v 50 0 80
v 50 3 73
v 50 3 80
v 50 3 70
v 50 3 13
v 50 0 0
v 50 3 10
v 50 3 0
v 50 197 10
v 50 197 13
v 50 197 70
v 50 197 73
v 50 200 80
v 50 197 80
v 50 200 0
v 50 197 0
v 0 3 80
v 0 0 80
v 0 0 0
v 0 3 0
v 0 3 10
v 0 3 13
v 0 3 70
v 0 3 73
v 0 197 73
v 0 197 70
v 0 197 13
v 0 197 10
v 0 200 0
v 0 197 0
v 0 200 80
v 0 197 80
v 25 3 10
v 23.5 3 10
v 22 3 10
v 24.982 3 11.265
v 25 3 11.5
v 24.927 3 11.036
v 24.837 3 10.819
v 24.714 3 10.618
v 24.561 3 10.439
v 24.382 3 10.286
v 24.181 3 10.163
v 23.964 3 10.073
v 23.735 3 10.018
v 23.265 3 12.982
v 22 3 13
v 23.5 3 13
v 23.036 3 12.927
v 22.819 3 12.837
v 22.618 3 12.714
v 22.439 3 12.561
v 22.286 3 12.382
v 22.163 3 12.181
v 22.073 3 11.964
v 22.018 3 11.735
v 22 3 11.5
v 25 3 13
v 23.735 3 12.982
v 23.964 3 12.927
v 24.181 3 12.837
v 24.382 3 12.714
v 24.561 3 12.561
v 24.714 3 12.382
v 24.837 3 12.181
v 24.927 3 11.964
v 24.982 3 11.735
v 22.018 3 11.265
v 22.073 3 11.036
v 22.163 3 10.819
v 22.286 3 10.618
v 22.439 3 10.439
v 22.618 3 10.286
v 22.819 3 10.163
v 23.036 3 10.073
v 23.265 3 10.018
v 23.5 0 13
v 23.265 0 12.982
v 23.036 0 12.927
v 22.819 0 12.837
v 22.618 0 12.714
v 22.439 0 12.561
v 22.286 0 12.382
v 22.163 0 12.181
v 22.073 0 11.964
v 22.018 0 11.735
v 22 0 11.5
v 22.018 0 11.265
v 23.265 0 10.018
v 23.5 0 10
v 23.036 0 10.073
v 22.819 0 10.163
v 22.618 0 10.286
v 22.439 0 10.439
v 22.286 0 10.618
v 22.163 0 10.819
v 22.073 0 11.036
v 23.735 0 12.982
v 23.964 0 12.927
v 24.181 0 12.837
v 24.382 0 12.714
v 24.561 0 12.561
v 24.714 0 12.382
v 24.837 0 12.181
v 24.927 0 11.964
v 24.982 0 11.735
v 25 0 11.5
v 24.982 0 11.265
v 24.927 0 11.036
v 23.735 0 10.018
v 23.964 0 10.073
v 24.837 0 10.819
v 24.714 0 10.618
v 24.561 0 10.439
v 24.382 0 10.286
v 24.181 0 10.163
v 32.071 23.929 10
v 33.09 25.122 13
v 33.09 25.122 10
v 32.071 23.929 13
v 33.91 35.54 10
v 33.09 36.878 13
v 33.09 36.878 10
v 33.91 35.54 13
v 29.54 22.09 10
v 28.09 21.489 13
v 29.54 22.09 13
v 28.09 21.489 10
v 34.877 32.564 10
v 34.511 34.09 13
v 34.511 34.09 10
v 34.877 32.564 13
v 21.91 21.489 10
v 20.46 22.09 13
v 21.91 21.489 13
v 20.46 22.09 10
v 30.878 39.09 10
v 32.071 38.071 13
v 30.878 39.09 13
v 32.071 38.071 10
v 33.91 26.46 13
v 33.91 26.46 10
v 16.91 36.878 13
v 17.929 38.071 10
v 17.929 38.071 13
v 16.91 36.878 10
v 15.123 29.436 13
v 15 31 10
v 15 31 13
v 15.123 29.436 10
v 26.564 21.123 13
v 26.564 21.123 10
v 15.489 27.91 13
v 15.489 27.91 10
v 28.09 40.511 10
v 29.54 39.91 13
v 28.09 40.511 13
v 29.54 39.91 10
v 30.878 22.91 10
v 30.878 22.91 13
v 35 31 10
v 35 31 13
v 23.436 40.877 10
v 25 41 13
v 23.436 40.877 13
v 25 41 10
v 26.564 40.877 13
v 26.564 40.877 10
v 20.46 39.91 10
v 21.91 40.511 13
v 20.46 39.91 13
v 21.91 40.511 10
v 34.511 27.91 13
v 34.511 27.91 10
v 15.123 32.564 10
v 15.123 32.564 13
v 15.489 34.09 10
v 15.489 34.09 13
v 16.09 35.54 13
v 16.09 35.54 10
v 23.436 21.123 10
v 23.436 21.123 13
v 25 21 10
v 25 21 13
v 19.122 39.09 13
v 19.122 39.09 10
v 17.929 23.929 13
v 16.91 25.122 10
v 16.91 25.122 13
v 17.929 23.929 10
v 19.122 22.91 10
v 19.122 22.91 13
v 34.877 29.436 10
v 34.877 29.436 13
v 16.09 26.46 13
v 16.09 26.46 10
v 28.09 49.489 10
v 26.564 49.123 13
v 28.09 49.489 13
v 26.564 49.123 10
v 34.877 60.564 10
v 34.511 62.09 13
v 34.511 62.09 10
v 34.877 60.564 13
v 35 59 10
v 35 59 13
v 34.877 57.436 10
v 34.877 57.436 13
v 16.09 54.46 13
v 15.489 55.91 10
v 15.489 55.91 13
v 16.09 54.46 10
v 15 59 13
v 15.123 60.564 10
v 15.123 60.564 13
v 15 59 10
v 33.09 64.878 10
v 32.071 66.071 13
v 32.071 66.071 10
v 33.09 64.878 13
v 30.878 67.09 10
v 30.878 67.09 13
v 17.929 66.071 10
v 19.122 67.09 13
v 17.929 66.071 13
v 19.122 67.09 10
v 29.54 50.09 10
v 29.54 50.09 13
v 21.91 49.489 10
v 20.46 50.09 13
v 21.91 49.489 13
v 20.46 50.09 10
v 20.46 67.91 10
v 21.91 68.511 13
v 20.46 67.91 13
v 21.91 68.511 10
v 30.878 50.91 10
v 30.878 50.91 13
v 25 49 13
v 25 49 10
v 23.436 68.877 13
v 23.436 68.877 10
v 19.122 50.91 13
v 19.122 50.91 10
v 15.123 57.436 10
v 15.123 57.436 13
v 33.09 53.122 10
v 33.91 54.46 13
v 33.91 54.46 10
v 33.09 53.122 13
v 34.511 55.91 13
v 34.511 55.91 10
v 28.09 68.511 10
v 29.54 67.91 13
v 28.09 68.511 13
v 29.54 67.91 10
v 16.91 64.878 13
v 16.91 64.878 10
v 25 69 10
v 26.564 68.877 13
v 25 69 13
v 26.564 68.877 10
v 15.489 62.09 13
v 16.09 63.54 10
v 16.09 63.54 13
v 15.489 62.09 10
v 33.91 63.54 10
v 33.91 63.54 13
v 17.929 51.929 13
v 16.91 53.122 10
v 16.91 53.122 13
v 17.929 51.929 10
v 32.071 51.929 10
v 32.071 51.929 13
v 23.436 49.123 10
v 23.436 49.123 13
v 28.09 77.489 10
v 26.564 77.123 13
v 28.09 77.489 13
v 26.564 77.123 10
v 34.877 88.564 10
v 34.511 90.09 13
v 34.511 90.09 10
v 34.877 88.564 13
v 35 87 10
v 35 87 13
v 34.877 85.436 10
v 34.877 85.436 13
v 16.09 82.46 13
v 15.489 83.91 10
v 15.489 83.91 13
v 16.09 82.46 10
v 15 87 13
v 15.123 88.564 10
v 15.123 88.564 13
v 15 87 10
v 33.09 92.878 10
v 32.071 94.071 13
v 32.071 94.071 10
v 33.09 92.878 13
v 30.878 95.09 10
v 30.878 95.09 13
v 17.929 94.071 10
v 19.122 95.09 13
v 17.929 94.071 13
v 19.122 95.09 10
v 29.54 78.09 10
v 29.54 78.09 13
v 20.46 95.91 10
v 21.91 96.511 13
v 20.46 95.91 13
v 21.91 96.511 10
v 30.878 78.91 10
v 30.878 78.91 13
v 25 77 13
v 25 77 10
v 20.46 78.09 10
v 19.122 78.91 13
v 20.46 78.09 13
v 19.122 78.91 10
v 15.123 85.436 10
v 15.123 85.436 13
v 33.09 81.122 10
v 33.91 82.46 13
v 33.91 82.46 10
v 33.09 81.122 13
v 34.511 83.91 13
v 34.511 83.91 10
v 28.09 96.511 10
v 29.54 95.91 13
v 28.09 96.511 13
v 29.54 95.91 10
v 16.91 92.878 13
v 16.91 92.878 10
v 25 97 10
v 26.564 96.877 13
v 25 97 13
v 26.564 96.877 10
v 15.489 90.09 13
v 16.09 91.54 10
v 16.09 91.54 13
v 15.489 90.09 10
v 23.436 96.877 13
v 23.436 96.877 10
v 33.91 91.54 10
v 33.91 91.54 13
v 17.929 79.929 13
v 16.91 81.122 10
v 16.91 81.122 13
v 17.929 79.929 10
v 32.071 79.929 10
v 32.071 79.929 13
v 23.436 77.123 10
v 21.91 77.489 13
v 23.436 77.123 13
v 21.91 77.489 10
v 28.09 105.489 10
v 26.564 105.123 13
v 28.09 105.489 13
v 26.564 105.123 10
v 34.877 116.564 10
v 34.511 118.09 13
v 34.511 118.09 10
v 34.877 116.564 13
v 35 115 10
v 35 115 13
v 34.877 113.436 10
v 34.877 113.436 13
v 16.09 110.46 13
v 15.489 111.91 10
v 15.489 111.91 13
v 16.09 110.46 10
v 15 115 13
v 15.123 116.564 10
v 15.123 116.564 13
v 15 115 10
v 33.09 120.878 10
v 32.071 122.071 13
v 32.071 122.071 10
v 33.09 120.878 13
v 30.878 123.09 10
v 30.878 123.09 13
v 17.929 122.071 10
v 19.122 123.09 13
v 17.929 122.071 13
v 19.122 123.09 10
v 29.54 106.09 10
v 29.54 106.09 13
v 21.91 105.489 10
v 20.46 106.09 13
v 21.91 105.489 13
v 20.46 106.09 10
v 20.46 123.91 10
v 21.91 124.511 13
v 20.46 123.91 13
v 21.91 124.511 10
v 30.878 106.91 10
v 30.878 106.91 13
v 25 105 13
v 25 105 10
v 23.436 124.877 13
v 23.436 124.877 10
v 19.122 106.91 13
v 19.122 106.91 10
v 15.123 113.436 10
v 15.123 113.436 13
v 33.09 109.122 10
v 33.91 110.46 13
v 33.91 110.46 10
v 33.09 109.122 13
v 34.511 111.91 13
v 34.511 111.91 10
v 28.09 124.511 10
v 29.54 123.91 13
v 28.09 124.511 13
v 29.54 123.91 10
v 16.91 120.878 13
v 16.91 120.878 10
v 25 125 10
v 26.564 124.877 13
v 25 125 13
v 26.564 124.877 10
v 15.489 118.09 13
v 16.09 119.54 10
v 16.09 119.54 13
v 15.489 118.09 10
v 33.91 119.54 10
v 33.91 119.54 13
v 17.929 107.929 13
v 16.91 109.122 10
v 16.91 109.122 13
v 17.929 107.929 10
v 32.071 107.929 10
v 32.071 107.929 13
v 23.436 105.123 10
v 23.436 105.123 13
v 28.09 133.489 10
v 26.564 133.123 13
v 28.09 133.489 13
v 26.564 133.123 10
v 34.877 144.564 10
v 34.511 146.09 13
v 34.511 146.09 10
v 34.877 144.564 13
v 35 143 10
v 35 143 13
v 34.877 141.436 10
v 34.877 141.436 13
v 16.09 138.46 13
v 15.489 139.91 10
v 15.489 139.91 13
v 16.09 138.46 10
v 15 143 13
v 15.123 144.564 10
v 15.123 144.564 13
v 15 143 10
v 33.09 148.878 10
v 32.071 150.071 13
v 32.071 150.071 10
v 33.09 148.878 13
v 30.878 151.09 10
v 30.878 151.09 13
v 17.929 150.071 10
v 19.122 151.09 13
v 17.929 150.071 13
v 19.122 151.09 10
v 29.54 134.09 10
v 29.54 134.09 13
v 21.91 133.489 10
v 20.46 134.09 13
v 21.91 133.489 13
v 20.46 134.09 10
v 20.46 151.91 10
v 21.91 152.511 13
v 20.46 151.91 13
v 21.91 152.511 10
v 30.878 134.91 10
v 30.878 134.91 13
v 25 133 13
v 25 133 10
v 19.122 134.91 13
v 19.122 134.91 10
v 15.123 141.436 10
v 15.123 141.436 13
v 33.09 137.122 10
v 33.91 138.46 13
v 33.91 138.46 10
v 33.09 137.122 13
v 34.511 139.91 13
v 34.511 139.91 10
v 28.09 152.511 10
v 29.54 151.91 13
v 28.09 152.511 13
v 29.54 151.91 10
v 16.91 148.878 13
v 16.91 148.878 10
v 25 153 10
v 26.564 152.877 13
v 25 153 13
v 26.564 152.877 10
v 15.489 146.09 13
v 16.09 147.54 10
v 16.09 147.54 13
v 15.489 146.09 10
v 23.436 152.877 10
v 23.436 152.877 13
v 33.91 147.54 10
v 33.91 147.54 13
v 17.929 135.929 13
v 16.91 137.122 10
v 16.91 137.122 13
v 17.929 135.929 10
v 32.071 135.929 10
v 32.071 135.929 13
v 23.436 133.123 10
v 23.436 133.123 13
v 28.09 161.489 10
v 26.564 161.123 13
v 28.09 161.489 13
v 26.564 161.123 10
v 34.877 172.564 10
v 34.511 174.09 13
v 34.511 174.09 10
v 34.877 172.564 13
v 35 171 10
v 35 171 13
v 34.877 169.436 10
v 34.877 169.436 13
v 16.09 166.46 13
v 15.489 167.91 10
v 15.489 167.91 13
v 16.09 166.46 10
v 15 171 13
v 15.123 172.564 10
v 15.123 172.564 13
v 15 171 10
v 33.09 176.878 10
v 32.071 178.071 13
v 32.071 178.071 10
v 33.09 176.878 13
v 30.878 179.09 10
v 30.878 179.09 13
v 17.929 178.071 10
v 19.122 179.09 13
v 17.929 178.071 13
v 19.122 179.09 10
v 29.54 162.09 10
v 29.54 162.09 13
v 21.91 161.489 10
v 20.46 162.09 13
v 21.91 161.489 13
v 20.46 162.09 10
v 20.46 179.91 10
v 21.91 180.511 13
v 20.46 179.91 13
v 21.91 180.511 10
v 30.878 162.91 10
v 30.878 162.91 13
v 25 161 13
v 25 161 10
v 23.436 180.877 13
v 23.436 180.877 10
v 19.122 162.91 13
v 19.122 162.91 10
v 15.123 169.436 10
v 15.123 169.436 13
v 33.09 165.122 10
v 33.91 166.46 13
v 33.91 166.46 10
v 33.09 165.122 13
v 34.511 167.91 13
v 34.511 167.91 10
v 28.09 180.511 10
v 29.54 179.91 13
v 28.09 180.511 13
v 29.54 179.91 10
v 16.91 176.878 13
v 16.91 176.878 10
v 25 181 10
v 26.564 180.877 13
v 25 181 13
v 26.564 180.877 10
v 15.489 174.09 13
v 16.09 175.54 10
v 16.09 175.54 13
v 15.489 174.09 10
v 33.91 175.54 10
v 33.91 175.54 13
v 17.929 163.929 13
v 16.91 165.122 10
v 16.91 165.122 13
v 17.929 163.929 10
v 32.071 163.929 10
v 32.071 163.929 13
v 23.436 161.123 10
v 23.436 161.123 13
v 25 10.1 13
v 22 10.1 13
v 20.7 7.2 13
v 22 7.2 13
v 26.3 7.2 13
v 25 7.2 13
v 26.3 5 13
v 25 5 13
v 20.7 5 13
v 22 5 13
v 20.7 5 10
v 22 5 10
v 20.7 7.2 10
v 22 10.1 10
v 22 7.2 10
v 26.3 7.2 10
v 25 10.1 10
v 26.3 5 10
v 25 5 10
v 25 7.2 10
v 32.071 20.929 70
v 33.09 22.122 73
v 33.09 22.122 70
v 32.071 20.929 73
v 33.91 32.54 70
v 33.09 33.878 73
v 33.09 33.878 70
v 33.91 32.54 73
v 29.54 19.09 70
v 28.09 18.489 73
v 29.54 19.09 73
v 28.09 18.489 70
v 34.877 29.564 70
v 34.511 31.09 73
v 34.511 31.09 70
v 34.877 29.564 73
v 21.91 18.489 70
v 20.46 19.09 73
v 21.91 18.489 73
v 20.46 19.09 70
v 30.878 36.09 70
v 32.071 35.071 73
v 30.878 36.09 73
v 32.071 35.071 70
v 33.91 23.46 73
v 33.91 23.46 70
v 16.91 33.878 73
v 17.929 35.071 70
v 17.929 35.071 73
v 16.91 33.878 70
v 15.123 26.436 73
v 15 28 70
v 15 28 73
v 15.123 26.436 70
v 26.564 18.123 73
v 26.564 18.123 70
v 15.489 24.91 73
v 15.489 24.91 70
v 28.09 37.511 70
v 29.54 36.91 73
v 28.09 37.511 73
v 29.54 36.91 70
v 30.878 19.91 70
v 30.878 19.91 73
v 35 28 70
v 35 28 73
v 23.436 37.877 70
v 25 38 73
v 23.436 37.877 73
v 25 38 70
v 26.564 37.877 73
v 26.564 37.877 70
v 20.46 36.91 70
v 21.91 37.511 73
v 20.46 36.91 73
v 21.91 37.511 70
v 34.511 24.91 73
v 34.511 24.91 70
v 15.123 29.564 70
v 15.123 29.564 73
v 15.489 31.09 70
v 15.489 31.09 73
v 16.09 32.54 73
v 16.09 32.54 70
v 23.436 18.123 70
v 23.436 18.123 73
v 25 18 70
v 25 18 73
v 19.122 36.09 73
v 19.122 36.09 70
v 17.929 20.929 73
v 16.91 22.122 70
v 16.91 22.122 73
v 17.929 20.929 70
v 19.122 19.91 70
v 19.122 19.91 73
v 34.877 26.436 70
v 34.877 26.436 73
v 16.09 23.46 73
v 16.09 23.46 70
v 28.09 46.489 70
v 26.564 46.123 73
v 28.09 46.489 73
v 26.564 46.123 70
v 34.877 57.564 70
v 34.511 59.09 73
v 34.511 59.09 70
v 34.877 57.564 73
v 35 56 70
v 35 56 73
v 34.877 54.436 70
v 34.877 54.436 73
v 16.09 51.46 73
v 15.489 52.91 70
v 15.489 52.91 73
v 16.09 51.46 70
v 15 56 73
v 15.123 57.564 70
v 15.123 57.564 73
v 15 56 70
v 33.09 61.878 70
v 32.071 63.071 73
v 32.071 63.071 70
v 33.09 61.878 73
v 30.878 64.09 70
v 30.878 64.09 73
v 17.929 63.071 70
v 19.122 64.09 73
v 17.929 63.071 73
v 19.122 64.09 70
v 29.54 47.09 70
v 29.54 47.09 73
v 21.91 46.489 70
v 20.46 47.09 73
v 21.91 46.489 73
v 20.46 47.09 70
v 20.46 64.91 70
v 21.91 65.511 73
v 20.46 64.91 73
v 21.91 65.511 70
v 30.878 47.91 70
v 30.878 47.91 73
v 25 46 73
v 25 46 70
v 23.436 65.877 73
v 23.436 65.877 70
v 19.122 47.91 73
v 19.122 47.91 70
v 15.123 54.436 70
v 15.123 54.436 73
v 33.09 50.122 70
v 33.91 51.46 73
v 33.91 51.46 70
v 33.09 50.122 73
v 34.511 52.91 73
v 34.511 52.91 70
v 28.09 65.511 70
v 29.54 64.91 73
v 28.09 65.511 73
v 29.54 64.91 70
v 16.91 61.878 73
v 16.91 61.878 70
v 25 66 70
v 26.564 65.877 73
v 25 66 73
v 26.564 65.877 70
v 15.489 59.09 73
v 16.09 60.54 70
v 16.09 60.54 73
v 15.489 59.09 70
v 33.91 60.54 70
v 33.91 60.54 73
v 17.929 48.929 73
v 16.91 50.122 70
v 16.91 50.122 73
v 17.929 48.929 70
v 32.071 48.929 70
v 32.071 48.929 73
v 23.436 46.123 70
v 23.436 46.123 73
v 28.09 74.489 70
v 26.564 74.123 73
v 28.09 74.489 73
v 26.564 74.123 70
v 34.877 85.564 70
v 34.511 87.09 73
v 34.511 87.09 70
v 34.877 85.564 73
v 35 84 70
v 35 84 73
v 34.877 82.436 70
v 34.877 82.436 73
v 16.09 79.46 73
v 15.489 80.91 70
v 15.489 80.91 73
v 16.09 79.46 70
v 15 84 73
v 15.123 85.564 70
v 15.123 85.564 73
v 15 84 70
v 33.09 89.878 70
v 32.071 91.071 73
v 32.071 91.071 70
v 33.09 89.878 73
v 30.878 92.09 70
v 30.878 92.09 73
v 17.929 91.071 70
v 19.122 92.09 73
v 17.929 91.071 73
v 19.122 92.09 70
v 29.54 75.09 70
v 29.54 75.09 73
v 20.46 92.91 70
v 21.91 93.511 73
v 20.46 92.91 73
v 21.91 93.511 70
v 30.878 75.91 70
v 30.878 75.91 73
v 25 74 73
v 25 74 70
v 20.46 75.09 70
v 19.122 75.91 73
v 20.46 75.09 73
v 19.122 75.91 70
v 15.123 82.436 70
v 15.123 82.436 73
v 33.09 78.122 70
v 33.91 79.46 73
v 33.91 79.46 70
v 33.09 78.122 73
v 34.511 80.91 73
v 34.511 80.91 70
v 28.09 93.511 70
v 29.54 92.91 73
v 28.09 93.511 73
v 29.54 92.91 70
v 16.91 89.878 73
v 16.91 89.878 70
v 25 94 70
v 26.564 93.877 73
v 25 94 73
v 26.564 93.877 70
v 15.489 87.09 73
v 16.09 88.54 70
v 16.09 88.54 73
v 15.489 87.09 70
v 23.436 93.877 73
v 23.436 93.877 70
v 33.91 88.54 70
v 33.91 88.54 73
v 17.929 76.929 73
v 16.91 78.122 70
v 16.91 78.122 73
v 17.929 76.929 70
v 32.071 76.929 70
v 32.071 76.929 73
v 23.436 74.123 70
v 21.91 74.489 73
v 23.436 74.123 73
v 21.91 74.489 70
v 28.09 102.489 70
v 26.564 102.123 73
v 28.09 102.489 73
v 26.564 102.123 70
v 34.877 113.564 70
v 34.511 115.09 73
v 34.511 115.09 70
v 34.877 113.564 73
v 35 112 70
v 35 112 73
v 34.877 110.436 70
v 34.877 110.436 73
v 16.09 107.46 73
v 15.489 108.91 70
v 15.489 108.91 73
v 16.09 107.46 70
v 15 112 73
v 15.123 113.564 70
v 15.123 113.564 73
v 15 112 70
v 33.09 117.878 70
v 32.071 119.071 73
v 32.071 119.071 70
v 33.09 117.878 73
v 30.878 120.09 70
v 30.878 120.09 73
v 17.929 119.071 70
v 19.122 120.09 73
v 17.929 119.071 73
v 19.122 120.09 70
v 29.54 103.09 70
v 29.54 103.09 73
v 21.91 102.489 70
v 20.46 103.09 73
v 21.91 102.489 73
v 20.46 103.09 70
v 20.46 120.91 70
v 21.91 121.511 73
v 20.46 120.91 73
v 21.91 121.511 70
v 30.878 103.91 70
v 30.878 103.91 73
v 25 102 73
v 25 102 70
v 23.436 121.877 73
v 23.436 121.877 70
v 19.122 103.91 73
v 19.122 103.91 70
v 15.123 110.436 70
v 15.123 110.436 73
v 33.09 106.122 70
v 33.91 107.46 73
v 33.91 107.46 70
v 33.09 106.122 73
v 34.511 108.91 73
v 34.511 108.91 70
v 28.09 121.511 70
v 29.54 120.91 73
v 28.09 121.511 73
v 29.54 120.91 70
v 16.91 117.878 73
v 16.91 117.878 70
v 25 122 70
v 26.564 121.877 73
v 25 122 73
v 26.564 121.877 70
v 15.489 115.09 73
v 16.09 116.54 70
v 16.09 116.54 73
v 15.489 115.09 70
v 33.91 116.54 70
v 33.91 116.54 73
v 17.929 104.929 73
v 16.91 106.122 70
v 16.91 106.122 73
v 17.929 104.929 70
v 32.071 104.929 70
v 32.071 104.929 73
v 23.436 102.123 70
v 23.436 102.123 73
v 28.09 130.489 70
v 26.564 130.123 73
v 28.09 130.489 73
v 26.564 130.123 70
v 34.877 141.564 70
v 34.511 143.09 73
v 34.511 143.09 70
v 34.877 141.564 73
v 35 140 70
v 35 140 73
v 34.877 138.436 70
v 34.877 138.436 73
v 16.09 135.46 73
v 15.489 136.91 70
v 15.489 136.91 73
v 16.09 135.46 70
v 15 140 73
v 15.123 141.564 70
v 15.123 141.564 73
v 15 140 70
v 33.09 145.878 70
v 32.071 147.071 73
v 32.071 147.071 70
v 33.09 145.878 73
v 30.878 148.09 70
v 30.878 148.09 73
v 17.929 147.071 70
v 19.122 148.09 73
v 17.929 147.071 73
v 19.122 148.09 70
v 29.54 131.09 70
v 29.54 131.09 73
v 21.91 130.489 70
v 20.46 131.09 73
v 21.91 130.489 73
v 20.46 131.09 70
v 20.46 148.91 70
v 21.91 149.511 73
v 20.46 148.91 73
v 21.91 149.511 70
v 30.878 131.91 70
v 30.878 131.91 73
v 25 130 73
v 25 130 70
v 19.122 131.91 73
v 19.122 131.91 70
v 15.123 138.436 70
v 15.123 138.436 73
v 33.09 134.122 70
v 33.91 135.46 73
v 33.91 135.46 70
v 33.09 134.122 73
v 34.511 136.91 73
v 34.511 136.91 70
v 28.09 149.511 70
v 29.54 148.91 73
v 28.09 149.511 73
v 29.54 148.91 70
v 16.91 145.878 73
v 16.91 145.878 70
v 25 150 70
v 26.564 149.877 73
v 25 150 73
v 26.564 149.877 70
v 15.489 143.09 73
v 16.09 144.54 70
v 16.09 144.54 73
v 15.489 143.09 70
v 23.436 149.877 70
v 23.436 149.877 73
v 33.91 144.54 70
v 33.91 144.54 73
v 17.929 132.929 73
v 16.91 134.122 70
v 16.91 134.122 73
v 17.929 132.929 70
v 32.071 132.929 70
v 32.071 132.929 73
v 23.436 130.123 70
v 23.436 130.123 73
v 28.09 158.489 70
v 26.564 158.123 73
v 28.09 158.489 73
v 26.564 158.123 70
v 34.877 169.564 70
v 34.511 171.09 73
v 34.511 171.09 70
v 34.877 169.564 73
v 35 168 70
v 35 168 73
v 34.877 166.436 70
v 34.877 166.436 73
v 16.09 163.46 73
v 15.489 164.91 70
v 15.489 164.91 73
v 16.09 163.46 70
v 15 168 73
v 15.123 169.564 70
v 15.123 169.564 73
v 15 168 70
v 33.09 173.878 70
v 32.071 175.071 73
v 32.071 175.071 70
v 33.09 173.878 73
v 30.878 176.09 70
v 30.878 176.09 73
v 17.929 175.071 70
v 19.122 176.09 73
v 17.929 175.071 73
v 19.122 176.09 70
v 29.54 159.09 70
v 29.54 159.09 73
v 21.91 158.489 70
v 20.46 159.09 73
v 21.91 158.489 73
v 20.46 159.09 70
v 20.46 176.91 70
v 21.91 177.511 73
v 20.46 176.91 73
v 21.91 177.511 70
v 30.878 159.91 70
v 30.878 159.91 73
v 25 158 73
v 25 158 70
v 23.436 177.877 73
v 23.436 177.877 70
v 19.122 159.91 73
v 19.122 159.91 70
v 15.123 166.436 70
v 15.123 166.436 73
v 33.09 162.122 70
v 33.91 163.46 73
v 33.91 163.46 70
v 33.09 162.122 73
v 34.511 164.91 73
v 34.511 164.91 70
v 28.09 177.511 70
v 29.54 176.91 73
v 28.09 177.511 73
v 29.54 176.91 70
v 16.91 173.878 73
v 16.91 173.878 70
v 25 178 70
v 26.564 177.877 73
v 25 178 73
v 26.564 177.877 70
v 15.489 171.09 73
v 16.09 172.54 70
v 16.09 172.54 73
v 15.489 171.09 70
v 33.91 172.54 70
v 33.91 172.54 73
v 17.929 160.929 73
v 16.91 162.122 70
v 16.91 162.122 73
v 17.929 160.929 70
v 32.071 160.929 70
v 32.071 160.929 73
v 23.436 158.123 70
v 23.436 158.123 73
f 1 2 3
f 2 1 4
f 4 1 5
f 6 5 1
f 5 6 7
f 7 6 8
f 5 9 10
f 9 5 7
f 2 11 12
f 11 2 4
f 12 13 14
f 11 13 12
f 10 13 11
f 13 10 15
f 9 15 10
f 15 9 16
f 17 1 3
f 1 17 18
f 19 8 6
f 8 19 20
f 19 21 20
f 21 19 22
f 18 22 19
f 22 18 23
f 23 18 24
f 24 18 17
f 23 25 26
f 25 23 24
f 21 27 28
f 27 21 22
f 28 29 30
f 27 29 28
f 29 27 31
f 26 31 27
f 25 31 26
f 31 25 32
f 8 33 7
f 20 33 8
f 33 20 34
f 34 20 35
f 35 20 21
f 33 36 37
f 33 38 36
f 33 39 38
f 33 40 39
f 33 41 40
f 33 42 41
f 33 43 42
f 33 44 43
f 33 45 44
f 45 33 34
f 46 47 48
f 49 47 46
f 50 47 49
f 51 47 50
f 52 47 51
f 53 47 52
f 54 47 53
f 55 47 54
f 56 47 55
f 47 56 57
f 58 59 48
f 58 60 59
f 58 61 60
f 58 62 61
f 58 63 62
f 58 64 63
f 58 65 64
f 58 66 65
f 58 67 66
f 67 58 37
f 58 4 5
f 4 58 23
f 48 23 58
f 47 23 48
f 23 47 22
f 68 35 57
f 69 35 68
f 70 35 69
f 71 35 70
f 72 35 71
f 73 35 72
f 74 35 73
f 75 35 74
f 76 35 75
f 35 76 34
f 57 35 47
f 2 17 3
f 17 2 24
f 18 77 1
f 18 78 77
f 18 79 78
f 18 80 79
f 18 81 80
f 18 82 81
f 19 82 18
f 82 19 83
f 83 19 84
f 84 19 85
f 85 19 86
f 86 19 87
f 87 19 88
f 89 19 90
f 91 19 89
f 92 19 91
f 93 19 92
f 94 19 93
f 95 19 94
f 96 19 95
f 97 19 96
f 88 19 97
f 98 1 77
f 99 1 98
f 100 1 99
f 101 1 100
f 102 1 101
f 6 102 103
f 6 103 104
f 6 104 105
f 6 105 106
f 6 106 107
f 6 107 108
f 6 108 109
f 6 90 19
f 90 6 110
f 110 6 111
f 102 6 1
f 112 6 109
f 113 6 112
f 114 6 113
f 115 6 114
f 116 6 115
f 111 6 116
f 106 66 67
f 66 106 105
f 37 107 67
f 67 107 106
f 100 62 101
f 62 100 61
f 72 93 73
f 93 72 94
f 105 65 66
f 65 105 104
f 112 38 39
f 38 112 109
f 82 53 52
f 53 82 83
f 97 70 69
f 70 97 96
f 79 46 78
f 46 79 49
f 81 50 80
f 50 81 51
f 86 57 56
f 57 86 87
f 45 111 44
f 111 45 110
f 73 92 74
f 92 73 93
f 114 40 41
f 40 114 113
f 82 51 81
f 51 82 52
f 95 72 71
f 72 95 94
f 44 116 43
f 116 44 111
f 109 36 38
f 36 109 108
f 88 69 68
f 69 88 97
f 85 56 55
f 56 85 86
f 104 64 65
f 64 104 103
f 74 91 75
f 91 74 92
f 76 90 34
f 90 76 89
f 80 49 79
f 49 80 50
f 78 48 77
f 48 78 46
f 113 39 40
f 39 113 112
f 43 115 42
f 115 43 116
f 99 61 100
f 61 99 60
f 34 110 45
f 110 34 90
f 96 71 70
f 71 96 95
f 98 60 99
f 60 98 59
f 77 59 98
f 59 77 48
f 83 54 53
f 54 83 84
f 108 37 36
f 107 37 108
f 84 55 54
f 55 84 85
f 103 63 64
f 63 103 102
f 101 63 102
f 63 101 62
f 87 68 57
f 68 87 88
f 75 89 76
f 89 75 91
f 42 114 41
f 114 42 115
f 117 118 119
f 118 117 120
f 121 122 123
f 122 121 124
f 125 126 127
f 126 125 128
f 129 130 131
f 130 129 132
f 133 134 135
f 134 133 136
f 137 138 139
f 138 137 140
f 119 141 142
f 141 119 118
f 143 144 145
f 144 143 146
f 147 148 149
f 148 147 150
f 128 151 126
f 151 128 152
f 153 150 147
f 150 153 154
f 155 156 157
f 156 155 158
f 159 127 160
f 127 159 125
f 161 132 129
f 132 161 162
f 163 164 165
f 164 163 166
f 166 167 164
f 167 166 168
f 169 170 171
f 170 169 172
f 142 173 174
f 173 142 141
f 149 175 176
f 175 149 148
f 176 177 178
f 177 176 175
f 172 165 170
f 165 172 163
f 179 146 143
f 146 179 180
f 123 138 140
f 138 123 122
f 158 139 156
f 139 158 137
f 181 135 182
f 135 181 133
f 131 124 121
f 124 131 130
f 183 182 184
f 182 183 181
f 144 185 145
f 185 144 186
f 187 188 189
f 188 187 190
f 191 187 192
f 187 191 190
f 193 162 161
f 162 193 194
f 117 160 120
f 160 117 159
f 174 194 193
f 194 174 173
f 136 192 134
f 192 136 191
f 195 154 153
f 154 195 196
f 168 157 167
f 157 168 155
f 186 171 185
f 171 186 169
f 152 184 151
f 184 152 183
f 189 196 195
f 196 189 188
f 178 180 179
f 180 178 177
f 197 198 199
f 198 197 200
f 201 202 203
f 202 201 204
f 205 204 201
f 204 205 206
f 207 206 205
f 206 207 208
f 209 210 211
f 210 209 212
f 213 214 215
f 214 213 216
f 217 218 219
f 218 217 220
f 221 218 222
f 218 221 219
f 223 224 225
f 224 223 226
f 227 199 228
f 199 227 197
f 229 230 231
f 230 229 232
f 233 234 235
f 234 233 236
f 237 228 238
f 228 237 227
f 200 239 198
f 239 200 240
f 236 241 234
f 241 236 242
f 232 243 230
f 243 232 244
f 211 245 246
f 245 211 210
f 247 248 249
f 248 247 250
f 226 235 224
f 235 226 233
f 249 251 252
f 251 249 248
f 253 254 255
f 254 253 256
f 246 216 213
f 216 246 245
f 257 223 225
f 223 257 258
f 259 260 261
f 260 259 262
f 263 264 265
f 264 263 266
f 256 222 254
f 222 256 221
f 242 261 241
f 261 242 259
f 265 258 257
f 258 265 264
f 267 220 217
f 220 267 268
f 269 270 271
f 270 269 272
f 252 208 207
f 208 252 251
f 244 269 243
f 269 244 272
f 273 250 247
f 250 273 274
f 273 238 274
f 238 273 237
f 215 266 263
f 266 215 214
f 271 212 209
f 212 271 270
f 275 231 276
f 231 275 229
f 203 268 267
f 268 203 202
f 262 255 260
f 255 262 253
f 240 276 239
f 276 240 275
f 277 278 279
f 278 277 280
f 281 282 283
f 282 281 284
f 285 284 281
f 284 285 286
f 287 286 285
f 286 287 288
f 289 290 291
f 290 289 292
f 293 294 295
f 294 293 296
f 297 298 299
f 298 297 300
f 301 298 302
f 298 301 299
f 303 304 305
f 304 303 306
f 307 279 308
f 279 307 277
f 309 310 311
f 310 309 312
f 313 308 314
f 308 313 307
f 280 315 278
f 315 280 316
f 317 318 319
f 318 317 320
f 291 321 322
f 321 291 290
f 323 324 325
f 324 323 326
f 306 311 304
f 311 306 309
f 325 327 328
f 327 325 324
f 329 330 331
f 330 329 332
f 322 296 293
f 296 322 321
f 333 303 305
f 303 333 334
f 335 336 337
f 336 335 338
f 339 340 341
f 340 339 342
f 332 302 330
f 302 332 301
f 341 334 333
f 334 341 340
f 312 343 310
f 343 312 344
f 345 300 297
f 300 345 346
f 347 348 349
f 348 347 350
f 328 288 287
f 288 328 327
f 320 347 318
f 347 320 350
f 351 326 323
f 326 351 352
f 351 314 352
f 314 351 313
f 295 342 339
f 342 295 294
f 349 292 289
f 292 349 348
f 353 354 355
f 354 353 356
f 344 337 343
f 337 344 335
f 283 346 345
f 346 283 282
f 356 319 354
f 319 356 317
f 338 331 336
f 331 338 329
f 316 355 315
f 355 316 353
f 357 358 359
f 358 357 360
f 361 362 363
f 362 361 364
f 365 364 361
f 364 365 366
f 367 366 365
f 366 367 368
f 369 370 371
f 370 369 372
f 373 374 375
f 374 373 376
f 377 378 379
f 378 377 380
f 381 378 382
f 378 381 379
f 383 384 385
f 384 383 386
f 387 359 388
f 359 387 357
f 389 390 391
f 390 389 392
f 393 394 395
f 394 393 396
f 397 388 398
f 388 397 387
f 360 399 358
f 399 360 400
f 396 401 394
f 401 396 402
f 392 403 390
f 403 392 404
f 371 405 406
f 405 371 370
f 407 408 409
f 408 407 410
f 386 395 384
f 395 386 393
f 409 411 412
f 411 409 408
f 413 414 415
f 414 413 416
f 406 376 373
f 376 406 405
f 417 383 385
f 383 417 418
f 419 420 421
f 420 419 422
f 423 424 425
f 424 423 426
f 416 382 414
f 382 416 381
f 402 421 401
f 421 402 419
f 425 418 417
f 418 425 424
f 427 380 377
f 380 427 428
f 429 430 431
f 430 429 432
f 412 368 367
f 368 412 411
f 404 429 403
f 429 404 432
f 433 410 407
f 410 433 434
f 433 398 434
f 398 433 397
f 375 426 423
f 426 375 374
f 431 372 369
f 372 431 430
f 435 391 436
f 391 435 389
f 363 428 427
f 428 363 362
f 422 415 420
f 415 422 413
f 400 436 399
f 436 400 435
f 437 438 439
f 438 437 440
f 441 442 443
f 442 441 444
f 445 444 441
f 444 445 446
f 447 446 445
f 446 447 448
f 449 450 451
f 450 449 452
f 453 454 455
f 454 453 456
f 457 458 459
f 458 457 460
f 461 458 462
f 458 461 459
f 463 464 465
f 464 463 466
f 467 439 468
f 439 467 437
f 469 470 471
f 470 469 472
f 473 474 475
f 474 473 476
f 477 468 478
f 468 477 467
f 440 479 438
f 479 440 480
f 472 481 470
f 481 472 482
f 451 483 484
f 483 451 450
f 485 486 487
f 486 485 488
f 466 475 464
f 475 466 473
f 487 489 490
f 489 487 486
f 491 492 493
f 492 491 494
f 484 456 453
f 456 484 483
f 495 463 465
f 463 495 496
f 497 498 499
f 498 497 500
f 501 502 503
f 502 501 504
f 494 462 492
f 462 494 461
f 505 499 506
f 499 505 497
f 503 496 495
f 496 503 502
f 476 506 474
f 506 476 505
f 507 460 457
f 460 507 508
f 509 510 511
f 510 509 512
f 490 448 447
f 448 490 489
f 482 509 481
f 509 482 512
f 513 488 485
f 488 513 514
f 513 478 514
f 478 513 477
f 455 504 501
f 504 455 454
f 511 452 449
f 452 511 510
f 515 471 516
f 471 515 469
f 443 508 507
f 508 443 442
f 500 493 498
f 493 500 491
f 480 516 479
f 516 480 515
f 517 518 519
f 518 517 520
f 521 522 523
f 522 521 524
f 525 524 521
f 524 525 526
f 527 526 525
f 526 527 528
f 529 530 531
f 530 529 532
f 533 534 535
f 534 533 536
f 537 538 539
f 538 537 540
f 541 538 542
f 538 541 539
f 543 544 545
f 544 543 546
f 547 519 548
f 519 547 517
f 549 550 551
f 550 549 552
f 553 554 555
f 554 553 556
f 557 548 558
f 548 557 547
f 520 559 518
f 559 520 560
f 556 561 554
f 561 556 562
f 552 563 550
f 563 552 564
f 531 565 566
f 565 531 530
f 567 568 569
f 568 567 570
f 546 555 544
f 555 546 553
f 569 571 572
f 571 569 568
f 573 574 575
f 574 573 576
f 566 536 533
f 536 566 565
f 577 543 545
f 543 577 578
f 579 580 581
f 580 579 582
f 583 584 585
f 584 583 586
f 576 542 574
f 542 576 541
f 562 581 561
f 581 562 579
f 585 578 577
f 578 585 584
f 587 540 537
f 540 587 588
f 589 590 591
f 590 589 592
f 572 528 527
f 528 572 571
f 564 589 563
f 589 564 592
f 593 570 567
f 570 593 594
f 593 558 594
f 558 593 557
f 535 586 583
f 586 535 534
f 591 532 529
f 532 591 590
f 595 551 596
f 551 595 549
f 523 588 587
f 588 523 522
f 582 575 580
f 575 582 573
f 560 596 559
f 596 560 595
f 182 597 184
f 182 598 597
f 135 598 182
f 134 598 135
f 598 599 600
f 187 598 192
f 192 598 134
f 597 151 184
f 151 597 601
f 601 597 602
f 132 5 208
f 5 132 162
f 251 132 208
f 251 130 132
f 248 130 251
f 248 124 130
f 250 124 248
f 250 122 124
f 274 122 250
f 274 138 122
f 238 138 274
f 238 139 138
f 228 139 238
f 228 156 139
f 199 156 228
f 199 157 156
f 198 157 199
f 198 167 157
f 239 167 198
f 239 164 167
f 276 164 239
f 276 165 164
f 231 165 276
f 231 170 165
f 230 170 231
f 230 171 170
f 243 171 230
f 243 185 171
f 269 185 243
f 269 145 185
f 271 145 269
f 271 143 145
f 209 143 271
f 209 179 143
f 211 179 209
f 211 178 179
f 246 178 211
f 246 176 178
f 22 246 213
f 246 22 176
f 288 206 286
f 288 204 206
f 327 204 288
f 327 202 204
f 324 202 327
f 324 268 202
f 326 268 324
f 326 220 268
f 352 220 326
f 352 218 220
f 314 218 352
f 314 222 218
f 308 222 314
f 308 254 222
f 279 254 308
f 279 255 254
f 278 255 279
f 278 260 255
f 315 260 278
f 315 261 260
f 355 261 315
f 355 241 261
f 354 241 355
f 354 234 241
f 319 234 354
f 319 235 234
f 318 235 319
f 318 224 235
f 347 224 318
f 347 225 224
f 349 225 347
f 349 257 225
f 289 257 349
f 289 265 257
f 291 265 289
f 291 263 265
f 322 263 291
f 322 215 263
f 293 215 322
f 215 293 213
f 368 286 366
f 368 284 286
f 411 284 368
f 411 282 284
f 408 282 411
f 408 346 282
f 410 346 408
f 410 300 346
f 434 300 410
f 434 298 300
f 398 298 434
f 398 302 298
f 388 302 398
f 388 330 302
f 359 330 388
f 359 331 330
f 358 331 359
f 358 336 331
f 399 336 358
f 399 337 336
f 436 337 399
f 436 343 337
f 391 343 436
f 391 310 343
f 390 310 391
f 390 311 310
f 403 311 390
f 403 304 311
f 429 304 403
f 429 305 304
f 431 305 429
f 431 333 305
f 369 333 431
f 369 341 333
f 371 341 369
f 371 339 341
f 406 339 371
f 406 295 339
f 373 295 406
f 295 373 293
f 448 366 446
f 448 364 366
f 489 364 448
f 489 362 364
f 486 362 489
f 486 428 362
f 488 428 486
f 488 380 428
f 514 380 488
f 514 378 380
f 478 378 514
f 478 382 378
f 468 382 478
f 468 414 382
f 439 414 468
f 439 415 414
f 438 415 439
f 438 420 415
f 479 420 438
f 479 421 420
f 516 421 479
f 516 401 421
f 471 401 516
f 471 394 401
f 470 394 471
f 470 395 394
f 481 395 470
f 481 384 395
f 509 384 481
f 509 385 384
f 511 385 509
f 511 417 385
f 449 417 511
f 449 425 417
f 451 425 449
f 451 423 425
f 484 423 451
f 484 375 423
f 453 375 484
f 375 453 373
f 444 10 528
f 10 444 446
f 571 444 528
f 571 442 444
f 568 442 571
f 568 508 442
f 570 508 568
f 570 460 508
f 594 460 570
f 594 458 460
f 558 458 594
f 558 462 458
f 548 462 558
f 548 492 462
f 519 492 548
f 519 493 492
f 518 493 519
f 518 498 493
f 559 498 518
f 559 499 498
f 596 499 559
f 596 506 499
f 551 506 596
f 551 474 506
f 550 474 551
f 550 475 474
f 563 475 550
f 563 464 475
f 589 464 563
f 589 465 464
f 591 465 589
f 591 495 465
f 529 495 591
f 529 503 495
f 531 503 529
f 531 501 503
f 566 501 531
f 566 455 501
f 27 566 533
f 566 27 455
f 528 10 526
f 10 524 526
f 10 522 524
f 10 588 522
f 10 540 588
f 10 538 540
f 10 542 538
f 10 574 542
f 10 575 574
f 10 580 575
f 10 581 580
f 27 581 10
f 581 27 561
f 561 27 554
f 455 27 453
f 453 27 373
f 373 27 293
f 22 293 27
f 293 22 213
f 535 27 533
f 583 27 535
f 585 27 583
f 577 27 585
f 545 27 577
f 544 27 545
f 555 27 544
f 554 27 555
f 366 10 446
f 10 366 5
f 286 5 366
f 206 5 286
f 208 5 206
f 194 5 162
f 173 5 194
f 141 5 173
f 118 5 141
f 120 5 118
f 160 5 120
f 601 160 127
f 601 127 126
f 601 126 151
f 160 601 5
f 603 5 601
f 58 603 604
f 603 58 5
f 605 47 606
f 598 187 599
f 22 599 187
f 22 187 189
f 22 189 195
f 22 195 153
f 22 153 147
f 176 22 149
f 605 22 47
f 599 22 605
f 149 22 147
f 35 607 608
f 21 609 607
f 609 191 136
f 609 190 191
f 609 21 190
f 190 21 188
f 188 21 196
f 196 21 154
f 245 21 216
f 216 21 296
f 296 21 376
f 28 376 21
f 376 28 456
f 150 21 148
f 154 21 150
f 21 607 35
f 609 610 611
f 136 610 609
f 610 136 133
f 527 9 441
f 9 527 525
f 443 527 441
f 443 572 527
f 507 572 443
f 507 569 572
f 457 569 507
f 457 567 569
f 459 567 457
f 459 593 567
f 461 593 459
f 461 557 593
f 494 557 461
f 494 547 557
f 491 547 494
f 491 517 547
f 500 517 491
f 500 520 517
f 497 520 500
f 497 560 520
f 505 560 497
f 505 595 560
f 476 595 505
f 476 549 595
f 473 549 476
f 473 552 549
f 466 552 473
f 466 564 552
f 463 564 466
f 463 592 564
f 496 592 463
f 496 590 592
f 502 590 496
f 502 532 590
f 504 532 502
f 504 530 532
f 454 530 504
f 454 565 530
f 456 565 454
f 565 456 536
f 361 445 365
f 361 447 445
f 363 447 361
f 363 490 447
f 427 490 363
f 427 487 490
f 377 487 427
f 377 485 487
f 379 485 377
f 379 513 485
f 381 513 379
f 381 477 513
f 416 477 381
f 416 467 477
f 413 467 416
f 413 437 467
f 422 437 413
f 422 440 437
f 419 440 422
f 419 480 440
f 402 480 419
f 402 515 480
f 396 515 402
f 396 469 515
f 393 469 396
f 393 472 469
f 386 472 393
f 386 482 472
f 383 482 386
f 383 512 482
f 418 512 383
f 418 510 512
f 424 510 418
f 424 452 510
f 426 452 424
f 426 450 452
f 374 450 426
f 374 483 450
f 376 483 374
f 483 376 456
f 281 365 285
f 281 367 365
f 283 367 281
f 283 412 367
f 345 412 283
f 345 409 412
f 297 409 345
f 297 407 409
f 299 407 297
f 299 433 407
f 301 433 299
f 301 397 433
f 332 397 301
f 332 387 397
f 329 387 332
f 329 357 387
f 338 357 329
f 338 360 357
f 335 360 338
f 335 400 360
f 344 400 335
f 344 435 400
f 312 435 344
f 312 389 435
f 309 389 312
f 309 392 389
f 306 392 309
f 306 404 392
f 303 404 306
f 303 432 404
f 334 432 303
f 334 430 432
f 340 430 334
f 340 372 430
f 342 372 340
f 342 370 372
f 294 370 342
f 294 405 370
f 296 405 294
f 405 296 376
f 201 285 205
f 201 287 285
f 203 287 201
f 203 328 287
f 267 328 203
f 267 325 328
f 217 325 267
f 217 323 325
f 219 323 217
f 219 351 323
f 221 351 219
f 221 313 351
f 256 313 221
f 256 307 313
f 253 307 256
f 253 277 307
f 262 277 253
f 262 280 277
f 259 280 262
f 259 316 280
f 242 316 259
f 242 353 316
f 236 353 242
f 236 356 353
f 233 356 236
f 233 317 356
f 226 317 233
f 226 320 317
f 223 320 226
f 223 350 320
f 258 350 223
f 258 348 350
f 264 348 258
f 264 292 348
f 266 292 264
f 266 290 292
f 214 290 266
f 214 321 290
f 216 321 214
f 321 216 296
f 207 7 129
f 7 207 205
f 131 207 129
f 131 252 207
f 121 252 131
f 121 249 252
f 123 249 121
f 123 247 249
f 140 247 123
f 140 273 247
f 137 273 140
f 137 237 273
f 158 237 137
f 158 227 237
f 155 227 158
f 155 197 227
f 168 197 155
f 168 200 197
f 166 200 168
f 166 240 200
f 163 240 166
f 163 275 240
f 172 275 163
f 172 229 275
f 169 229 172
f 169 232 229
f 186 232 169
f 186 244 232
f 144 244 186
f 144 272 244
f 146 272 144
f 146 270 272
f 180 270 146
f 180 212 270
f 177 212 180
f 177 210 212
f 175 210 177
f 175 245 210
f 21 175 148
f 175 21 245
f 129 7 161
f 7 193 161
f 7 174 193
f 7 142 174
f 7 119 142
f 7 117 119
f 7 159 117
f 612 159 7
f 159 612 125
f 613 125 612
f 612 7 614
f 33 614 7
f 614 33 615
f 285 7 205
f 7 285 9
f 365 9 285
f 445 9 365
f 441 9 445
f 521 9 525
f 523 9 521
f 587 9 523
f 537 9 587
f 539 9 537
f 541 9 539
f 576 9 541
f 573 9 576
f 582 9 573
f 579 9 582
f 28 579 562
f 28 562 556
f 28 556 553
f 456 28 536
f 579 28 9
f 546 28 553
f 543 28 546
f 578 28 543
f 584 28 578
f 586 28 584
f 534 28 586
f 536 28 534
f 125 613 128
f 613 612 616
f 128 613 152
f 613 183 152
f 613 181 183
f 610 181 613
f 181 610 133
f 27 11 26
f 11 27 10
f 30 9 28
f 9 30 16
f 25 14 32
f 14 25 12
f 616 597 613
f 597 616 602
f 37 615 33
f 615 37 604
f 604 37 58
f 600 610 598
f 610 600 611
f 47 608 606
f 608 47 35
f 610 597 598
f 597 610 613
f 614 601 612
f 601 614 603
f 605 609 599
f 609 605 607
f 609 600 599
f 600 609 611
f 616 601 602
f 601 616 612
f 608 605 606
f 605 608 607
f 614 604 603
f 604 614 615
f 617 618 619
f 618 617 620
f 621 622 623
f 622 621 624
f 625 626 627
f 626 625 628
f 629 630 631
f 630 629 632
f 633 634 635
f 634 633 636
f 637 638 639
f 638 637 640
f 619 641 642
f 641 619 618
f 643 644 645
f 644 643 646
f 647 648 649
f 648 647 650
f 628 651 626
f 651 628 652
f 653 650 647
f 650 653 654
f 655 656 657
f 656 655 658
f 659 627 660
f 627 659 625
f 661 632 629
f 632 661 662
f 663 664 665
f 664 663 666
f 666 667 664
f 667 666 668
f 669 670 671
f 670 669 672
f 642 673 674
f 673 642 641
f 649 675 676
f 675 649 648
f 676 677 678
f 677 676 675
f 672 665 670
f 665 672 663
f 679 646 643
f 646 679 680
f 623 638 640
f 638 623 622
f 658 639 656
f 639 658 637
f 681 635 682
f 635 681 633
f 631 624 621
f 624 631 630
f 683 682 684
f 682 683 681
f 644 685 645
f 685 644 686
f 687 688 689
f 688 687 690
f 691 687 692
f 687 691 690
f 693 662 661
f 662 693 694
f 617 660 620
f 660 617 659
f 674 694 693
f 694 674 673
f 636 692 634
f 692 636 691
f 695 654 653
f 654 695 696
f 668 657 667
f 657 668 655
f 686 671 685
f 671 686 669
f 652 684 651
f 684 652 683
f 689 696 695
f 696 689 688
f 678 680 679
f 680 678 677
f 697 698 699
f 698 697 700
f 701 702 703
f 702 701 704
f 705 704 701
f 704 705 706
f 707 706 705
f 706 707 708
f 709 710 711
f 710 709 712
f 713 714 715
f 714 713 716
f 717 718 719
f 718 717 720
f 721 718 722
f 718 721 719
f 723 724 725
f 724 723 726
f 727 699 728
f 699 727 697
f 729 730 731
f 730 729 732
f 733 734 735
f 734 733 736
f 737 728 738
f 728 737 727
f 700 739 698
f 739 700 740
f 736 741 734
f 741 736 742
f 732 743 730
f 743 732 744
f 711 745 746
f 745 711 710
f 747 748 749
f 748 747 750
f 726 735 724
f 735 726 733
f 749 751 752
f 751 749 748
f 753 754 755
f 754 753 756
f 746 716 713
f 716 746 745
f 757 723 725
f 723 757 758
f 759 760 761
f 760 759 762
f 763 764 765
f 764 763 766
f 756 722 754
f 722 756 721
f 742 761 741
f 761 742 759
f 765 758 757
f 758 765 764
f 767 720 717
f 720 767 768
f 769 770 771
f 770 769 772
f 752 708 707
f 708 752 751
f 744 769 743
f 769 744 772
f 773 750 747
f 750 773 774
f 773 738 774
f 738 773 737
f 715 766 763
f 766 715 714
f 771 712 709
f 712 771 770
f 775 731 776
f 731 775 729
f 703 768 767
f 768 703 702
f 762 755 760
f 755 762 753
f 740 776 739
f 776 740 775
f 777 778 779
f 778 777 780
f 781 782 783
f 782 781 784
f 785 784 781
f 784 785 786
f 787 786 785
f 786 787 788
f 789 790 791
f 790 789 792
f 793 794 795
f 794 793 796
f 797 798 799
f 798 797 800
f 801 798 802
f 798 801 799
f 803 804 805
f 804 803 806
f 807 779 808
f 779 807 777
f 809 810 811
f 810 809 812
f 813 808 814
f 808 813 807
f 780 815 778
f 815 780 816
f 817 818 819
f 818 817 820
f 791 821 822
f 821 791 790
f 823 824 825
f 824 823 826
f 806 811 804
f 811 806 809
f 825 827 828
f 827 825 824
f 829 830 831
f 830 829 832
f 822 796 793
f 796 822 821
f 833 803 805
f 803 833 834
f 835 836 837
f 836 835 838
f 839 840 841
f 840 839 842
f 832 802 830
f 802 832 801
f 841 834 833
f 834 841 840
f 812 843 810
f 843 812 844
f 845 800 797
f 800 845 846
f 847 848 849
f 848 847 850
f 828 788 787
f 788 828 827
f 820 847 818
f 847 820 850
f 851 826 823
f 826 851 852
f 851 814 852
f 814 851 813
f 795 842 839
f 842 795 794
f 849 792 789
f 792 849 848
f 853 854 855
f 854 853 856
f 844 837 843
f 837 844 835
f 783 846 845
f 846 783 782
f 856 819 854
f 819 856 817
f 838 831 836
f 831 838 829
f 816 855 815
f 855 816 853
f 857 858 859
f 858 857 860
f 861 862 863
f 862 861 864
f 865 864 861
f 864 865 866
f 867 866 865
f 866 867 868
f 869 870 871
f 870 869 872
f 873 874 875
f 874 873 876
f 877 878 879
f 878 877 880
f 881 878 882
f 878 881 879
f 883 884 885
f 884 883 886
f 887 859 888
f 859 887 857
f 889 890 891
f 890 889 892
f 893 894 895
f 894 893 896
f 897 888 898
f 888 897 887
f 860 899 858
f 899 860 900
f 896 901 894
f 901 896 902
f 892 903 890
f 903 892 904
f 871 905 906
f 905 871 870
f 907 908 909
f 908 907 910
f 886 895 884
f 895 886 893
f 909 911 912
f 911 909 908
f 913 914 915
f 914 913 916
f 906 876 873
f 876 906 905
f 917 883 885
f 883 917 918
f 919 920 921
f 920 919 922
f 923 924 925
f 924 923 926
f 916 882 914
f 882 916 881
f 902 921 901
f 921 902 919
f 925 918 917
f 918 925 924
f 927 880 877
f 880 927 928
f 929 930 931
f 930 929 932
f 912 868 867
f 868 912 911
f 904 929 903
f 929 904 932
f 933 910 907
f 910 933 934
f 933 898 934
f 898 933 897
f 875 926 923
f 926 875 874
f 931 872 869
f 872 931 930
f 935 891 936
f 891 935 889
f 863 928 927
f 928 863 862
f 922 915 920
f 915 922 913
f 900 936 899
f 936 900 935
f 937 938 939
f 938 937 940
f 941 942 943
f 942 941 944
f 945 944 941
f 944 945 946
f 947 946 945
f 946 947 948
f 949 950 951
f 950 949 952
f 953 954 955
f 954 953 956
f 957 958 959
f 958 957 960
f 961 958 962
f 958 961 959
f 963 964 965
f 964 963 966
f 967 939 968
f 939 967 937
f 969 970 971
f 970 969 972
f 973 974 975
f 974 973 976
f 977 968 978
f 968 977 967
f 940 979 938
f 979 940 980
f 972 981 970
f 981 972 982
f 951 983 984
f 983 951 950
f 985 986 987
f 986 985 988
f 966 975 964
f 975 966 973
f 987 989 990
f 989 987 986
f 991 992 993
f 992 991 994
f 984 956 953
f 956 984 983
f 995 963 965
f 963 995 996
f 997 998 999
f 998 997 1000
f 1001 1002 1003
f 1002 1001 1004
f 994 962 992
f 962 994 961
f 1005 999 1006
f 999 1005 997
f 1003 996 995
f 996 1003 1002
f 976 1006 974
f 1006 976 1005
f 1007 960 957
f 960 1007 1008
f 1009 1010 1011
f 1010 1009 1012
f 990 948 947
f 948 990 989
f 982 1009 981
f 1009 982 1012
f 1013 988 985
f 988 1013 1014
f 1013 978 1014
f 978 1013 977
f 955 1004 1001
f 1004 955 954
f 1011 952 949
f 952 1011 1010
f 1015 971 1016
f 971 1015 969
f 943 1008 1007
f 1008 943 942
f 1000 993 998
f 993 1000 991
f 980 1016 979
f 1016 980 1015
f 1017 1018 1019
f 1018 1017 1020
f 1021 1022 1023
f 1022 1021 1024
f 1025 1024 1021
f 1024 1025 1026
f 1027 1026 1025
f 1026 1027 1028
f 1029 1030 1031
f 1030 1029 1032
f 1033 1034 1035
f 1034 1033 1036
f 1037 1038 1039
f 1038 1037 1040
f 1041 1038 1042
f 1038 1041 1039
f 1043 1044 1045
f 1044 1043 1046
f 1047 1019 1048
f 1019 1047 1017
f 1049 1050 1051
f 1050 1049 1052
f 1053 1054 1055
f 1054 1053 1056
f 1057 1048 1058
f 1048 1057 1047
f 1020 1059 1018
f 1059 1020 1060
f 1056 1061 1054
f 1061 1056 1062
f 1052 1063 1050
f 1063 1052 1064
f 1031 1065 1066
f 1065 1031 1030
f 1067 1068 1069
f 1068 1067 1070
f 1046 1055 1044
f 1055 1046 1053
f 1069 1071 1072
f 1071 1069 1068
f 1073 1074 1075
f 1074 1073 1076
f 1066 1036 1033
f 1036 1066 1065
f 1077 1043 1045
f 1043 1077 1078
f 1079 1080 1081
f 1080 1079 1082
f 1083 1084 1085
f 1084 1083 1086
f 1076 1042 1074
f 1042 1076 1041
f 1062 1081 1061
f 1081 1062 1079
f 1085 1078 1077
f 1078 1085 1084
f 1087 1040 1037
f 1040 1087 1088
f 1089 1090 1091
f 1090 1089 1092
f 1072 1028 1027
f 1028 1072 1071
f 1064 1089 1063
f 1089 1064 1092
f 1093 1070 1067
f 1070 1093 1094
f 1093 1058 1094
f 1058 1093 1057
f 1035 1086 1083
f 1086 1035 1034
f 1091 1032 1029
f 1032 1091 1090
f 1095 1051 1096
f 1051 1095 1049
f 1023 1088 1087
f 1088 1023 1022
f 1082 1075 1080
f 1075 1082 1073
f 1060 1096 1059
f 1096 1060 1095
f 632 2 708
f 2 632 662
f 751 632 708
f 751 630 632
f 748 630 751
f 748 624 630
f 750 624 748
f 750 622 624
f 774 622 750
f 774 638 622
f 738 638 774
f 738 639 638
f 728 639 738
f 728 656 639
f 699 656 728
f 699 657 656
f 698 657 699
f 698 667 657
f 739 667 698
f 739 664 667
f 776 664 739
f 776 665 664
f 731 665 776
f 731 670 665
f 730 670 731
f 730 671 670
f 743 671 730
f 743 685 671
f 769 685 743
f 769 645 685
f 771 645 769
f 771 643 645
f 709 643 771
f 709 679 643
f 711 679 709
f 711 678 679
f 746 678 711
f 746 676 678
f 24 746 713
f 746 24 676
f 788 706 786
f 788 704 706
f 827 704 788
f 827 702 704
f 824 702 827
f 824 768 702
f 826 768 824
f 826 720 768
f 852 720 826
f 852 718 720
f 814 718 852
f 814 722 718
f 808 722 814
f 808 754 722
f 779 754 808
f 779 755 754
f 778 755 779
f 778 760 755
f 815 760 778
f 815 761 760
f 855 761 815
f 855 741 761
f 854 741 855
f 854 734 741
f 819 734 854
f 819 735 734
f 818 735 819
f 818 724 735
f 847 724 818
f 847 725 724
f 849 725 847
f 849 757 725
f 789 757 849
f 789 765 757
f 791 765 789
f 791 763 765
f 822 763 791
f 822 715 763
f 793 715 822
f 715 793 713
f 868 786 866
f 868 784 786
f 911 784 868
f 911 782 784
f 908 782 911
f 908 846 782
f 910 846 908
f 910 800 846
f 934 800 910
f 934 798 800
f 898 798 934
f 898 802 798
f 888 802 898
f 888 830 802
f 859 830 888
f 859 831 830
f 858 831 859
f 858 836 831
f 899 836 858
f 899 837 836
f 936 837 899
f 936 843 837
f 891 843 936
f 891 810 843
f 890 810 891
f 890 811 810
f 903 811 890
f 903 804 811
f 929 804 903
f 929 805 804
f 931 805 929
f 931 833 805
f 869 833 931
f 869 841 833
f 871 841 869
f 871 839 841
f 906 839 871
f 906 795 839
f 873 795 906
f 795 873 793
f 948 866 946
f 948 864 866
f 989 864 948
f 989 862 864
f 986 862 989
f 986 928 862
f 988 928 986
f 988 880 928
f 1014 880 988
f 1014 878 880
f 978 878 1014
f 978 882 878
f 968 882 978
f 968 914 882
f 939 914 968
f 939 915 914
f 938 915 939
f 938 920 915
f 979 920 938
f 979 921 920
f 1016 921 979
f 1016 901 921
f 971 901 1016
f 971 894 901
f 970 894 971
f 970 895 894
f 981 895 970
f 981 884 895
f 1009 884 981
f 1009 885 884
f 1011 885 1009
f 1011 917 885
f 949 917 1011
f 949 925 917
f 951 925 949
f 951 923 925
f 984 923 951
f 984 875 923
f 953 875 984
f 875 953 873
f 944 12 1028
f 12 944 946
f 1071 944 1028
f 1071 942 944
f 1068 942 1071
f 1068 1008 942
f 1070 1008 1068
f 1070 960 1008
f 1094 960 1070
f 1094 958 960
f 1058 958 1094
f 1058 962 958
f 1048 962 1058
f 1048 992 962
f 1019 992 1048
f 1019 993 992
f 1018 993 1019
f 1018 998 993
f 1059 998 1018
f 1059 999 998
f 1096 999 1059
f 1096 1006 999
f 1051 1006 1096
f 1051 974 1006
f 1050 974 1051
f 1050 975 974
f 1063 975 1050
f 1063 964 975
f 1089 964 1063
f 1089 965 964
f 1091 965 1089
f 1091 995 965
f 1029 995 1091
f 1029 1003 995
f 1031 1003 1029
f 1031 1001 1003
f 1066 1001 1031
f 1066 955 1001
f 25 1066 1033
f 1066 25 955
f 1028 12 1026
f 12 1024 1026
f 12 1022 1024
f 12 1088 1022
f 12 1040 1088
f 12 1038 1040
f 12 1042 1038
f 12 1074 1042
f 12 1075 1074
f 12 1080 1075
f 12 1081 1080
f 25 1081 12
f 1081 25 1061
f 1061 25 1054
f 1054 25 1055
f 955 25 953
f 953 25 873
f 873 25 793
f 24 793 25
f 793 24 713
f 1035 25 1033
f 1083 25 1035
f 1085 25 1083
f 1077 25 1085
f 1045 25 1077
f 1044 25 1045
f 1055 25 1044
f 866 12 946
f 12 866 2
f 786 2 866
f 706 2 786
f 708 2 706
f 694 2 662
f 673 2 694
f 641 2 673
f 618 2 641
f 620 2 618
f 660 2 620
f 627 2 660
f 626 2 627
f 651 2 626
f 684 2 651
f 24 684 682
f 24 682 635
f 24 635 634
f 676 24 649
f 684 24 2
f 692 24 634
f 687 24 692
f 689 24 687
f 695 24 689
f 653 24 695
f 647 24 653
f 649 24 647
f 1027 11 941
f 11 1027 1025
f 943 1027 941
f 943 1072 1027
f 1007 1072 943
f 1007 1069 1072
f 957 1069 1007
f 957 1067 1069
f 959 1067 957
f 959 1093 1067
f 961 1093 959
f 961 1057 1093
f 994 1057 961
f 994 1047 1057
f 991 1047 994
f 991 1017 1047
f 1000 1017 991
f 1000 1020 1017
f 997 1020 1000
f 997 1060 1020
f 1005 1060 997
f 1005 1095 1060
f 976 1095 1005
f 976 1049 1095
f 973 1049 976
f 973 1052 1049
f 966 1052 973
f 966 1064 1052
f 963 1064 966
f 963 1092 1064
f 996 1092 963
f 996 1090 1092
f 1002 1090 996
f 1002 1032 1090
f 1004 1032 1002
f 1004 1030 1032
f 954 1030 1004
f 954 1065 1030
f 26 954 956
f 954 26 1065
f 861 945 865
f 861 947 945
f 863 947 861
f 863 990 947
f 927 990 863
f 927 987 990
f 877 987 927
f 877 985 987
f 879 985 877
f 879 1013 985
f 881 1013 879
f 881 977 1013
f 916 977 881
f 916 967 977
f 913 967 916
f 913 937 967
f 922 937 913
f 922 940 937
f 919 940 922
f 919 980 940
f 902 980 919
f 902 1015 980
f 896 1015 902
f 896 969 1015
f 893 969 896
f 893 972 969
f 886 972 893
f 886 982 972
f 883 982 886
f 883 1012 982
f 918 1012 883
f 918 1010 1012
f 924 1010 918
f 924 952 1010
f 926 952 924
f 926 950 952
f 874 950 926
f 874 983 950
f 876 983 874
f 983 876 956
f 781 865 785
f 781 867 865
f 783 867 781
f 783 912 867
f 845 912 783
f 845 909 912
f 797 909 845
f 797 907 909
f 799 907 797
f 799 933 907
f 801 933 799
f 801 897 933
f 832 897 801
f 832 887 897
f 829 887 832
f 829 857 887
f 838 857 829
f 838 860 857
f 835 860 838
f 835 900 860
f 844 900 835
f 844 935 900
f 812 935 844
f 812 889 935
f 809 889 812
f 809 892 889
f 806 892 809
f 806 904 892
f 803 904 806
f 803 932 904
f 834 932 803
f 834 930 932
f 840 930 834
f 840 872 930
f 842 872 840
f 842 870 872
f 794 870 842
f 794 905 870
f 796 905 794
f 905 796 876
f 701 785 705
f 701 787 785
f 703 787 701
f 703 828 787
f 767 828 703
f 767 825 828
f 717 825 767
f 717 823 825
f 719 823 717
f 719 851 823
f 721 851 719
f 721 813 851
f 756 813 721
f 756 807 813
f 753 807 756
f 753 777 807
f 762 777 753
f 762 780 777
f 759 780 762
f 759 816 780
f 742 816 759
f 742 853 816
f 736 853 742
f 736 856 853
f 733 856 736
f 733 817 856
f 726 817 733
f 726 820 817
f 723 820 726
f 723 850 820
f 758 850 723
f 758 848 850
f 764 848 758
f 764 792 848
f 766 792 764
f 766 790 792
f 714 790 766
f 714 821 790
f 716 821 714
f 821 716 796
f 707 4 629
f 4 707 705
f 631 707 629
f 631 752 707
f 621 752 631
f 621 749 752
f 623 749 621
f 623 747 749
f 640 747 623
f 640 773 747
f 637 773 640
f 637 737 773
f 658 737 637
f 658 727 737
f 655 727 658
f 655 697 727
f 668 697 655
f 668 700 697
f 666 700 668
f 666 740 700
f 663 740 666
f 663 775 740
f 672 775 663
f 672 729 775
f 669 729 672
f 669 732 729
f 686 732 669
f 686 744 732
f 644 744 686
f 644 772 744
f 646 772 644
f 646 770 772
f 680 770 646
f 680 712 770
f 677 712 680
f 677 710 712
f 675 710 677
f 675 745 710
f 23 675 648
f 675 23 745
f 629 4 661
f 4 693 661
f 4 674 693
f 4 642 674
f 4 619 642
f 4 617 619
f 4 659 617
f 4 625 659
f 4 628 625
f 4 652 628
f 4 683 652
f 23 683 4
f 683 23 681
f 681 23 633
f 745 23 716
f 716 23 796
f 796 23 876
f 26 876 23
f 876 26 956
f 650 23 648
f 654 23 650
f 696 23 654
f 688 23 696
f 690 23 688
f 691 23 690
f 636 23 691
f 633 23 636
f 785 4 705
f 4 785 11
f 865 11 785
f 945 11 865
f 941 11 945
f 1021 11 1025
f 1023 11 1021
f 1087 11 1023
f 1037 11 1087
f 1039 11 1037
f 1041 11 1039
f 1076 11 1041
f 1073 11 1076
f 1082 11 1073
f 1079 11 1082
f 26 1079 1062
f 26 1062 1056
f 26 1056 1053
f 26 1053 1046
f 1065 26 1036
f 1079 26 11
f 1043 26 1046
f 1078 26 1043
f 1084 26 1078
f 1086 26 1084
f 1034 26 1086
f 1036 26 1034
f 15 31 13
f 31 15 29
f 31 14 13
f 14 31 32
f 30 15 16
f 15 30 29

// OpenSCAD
$fn=40; // resolution of the arcs

// left side
difference() {
	cube([50,3,80]);

	translate([23.5,3.1,11.5]){
		rotate([90,0,0]){
			cylinder(h=3.2, d=3);
		}
	}
}

//bottom plate
translate([0,3,10]) {

	difference() {

		difference() {
			cube([50,194,3]);
			for ( i = [1 : 6] ) {
				translate([25,i * 28,-0.1]) {
					cylinder(h=3.2,d=20);
				}
			}
		}

		translate([20.7,0,-0.1]) {
			translate([1.3,-0.1,0]) {
				cube([3,7.2,3.2]);
			}
			translate([0,2,0]) {
				cube([5.6,2.2,3.2]);
			}
		}

	}

}

//top plate
translate([0,0,70]) {
	difference() {
		cube([50,200,3]);
		for ( i = [1 : 6] ) {
			translate([25,i * 28,-0.1]) {
				cylinder(h=3.2,d=20);
			}
		}
	}
}

//right plate
translate([0,197,0]) {
	cube([50,3,80]);
}
